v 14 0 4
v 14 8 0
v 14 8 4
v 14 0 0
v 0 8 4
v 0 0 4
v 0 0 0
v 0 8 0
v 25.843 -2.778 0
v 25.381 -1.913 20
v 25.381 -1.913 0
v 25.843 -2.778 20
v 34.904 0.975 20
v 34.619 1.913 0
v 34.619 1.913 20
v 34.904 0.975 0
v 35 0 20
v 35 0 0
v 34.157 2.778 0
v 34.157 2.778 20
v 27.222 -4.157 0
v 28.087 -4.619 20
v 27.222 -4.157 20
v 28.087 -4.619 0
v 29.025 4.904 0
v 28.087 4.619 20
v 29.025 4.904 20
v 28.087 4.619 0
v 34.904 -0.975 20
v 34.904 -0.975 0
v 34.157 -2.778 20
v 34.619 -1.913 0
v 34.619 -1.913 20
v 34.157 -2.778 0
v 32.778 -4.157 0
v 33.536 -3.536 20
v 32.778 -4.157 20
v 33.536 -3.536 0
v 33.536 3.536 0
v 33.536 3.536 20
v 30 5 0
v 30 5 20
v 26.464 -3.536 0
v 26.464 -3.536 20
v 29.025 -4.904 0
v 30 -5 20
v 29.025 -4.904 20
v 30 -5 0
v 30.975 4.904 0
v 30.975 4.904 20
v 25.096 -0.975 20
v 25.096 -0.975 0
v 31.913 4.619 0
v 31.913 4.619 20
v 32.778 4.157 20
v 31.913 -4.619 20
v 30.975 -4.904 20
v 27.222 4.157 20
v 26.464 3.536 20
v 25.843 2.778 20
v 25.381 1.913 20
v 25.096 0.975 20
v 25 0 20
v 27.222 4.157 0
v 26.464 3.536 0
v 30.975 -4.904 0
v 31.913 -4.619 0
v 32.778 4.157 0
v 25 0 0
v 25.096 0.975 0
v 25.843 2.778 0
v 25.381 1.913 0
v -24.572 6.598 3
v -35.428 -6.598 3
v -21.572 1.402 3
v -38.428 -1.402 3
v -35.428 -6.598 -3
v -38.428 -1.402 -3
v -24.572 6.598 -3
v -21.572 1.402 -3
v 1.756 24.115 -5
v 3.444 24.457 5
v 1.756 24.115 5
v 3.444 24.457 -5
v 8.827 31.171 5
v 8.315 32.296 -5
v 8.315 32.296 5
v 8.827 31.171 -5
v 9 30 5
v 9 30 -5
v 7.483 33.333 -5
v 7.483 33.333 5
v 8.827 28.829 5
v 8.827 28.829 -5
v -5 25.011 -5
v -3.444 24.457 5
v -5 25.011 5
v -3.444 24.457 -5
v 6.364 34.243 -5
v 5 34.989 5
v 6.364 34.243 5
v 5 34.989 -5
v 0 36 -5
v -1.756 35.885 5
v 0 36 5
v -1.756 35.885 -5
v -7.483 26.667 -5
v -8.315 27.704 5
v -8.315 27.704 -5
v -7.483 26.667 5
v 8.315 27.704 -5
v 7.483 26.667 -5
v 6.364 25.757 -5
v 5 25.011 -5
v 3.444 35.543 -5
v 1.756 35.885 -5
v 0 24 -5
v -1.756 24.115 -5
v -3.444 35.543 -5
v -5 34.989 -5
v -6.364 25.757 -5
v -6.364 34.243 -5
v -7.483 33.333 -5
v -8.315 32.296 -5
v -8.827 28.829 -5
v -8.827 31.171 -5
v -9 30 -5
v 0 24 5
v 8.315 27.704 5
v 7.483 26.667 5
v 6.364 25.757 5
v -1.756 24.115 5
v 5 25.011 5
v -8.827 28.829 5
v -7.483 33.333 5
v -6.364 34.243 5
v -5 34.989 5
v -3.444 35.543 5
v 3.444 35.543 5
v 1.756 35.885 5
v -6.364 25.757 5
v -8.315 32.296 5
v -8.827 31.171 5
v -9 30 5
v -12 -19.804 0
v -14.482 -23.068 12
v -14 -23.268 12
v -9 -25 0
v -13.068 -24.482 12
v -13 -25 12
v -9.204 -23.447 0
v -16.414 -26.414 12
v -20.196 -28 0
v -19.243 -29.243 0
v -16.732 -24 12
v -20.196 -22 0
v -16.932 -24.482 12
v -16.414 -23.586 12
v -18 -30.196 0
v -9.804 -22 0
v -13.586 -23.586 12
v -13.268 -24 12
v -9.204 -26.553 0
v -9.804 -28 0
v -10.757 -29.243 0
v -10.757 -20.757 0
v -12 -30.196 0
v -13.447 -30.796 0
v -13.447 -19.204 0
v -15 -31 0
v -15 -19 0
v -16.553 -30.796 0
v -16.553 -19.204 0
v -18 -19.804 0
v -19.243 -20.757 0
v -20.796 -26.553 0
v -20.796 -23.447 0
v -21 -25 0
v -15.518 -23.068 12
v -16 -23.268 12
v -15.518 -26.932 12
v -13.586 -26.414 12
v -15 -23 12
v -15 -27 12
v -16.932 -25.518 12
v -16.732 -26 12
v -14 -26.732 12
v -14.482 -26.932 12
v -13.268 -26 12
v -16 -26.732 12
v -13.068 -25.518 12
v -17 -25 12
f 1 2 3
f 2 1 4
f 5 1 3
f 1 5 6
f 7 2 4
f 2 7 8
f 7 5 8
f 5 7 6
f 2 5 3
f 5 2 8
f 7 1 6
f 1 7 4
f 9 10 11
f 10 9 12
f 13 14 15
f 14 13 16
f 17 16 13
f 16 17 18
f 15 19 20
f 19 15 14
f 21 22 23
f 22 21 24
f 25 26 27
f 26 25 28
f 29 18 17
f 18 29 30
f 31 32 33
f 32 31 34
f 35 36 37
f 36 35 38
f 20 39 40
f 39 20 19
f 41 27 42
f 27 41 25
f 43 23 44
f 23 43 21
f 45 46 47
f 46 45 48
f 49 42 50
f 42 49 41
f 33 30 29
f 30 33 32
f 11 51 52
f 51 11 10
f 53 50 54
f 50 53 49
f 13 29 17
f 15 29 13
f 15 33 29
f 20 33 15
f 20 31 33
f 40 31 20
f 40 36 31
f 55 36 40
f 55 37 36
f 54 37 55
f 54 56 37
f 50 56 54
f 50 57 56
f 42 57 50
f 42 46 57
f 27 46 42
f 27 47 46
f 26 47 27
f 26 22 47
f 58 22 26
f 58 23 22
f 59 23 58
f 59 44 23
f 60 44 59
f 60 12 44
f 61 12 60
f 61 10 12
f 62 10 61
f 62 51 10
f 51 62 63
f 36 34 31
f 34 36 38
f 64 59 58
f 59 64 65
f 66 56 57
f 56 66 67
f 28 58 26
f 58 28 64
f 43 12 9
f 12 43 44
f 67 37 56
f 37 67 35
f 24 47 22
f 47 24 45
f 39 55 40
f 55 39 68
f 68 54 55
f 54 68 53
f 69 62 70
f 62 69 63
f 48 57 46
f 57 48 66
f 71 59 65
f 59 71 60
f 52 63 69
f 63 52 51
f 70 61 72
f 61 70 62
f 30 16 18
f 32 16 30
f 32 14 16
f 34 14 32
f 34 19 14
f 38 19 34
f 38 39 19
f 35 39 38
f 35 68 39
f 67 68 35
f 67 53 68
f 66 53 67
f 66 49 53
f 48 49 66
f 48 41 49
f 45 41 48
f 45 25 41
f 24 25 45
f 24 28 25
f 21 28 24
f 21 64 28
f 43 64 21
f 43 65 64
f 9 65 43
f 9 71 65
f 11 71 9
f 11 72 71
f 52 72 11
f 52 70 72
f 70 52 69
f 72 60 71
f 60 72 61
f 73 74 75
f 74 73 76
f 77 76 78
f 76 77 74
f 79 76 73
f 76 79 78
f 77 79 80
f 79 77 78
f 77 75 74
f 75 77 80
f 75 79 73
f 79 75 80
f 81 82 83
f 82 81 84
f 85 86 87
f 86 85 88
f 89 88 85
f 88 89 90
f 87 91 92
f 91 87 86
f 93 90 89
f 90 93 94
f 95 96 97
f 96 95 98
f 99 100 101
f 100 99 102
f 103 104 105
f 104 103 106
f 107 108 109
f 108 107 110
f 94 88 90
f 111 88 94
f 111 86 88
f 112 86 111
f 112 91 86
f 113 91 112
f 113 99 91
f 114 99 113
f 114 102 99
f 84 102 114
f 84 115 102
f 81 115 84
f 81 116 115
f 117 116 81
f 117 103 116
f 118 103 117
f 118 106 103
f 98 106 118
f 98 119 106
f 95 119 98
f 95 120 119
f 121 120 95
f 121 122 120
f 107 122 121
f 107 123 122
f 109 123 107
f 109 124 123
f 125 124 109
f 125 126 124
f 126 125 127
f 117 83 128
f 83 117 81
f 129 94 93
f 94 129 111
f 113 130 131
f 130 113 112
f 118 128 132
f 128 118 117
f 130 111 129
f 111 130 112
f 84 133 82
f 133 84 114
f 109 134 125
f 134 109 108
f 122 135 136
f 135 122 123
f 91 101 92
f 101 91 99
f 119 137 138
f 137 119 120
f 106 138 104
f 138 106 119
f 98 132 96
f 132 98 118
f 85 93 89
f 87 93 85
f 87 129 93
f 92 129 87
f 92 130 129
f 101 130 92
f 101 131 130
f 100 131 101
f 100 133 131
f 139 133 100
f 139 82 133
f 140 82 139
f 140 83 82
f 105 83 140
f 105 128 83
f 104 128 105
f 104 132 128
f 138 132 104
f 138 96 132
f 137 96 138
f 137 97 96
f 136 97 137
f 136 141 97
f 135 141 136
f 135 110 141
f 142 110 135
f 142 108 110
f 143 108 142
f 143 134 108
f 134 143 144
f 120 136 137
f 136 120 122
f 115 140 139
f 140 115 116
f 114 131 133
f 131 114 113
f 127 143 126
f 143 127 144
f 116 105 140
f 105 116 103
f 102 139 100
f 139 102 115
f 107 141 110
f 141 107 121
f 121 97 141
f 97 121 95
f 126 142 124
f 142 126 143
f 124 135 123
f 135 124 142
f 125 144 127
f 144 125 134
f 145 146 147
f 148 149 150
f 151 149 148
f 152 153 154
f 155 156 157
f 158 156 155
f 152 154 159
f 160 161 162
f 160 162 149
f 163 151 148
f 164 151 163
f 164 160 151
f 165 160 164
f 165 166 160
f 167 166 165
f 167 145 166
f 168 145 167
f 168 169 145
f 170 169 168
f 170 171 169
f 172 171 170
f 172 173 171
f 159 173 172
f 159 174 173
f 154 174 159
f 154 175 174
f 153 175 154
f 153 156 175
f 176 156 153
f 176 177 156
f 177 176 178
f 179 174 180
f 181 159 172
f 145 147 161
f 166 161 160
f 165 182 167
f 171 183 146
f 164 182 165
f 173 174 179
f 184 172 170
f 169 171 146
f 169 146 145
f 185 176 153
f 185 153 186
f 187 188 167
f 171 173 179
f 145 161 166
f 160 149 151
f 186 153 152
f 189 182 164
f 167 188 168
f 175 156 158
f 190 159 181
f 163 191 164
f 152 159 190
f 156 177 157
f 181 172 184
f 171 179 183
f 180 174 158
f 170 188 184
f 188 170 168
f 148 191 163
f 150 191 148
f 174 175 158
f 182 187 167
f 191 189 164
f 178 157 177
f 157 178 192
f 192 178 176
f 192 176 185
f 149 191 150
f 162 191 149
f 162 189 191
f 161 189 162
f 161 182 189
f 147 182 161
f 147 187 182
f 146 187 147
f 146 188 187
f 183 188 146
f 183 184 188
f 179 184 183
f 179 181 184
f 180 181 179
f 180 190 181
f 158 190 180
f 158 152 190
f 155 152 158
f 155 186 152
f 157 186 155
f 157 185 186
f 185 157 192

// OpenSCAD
// scadstudio gizmo QA fixture — M4/M5 manual testing
// Every shape below is deliberately asymmetric (no spheres as the primary
// test target — a sphere's rotational symmetry hides pivot and rotation-
// composition bugs, which is exactly how two rounds of real bugs slipped
// past earlier automated verification). Each shape is annotated with what
// it's specifically meant to exercise; see the accompanying checklist.

// 1. Bare cube, no wraps yet.
// Tests: first-ever translate/rotate/scale drag inserts a brand-new wrap.
cube([14, 8, 4]);

// 2. Translated-only cylinder, default (non-centered) orientation.
// Tests: rotate pivot correctness. This exact shape (a plain translate +
// off-center-bbox cylinder) is what revealed the original pivot bug —
// rotating it must spin it in place, never shift its position.
translate([30, 0, 0])
    cylinder(h=20, r=5, $fn=32);

// 3. Translated + already-rotated asymmetric block.
// Tests: patching an existing rotate (drag it again, confirm one updated
// rotate([...]) rather than a duplicate), and inserting a brand-new scale
// on top of an existing rotate (must land outside it in the source — the
// "resizes right while dragging, wrong after re-render" bug).
translate([-30, 0, 0])
    rotate([0, 0, 30])
        cube([16, 6, 6], center=true);

// 4. Translated + already non-uniformly scaled cylinder.
// Tests: scale composes multiplicatively (drag again, confirm the factors
// multiply into one scale([...]) rather than duplicating).
translate([0, 30, 0])
    scale([1.5, 1, 1])
        cylinder(h=10, r=6, center=true, $fn=32);

// 5. Translated wedge with a negative coordinate already present.
// Tests: negative numbers (parsed as unary_expression, not a plain number
// literal) are still recognized as an existing wrap — drag it again and
// confirm it patches in place instead of inserting a duplicate.
translate([-15, -25, 0])
    cylinder(h=12, r1=6, r2=2, $fn=24);
